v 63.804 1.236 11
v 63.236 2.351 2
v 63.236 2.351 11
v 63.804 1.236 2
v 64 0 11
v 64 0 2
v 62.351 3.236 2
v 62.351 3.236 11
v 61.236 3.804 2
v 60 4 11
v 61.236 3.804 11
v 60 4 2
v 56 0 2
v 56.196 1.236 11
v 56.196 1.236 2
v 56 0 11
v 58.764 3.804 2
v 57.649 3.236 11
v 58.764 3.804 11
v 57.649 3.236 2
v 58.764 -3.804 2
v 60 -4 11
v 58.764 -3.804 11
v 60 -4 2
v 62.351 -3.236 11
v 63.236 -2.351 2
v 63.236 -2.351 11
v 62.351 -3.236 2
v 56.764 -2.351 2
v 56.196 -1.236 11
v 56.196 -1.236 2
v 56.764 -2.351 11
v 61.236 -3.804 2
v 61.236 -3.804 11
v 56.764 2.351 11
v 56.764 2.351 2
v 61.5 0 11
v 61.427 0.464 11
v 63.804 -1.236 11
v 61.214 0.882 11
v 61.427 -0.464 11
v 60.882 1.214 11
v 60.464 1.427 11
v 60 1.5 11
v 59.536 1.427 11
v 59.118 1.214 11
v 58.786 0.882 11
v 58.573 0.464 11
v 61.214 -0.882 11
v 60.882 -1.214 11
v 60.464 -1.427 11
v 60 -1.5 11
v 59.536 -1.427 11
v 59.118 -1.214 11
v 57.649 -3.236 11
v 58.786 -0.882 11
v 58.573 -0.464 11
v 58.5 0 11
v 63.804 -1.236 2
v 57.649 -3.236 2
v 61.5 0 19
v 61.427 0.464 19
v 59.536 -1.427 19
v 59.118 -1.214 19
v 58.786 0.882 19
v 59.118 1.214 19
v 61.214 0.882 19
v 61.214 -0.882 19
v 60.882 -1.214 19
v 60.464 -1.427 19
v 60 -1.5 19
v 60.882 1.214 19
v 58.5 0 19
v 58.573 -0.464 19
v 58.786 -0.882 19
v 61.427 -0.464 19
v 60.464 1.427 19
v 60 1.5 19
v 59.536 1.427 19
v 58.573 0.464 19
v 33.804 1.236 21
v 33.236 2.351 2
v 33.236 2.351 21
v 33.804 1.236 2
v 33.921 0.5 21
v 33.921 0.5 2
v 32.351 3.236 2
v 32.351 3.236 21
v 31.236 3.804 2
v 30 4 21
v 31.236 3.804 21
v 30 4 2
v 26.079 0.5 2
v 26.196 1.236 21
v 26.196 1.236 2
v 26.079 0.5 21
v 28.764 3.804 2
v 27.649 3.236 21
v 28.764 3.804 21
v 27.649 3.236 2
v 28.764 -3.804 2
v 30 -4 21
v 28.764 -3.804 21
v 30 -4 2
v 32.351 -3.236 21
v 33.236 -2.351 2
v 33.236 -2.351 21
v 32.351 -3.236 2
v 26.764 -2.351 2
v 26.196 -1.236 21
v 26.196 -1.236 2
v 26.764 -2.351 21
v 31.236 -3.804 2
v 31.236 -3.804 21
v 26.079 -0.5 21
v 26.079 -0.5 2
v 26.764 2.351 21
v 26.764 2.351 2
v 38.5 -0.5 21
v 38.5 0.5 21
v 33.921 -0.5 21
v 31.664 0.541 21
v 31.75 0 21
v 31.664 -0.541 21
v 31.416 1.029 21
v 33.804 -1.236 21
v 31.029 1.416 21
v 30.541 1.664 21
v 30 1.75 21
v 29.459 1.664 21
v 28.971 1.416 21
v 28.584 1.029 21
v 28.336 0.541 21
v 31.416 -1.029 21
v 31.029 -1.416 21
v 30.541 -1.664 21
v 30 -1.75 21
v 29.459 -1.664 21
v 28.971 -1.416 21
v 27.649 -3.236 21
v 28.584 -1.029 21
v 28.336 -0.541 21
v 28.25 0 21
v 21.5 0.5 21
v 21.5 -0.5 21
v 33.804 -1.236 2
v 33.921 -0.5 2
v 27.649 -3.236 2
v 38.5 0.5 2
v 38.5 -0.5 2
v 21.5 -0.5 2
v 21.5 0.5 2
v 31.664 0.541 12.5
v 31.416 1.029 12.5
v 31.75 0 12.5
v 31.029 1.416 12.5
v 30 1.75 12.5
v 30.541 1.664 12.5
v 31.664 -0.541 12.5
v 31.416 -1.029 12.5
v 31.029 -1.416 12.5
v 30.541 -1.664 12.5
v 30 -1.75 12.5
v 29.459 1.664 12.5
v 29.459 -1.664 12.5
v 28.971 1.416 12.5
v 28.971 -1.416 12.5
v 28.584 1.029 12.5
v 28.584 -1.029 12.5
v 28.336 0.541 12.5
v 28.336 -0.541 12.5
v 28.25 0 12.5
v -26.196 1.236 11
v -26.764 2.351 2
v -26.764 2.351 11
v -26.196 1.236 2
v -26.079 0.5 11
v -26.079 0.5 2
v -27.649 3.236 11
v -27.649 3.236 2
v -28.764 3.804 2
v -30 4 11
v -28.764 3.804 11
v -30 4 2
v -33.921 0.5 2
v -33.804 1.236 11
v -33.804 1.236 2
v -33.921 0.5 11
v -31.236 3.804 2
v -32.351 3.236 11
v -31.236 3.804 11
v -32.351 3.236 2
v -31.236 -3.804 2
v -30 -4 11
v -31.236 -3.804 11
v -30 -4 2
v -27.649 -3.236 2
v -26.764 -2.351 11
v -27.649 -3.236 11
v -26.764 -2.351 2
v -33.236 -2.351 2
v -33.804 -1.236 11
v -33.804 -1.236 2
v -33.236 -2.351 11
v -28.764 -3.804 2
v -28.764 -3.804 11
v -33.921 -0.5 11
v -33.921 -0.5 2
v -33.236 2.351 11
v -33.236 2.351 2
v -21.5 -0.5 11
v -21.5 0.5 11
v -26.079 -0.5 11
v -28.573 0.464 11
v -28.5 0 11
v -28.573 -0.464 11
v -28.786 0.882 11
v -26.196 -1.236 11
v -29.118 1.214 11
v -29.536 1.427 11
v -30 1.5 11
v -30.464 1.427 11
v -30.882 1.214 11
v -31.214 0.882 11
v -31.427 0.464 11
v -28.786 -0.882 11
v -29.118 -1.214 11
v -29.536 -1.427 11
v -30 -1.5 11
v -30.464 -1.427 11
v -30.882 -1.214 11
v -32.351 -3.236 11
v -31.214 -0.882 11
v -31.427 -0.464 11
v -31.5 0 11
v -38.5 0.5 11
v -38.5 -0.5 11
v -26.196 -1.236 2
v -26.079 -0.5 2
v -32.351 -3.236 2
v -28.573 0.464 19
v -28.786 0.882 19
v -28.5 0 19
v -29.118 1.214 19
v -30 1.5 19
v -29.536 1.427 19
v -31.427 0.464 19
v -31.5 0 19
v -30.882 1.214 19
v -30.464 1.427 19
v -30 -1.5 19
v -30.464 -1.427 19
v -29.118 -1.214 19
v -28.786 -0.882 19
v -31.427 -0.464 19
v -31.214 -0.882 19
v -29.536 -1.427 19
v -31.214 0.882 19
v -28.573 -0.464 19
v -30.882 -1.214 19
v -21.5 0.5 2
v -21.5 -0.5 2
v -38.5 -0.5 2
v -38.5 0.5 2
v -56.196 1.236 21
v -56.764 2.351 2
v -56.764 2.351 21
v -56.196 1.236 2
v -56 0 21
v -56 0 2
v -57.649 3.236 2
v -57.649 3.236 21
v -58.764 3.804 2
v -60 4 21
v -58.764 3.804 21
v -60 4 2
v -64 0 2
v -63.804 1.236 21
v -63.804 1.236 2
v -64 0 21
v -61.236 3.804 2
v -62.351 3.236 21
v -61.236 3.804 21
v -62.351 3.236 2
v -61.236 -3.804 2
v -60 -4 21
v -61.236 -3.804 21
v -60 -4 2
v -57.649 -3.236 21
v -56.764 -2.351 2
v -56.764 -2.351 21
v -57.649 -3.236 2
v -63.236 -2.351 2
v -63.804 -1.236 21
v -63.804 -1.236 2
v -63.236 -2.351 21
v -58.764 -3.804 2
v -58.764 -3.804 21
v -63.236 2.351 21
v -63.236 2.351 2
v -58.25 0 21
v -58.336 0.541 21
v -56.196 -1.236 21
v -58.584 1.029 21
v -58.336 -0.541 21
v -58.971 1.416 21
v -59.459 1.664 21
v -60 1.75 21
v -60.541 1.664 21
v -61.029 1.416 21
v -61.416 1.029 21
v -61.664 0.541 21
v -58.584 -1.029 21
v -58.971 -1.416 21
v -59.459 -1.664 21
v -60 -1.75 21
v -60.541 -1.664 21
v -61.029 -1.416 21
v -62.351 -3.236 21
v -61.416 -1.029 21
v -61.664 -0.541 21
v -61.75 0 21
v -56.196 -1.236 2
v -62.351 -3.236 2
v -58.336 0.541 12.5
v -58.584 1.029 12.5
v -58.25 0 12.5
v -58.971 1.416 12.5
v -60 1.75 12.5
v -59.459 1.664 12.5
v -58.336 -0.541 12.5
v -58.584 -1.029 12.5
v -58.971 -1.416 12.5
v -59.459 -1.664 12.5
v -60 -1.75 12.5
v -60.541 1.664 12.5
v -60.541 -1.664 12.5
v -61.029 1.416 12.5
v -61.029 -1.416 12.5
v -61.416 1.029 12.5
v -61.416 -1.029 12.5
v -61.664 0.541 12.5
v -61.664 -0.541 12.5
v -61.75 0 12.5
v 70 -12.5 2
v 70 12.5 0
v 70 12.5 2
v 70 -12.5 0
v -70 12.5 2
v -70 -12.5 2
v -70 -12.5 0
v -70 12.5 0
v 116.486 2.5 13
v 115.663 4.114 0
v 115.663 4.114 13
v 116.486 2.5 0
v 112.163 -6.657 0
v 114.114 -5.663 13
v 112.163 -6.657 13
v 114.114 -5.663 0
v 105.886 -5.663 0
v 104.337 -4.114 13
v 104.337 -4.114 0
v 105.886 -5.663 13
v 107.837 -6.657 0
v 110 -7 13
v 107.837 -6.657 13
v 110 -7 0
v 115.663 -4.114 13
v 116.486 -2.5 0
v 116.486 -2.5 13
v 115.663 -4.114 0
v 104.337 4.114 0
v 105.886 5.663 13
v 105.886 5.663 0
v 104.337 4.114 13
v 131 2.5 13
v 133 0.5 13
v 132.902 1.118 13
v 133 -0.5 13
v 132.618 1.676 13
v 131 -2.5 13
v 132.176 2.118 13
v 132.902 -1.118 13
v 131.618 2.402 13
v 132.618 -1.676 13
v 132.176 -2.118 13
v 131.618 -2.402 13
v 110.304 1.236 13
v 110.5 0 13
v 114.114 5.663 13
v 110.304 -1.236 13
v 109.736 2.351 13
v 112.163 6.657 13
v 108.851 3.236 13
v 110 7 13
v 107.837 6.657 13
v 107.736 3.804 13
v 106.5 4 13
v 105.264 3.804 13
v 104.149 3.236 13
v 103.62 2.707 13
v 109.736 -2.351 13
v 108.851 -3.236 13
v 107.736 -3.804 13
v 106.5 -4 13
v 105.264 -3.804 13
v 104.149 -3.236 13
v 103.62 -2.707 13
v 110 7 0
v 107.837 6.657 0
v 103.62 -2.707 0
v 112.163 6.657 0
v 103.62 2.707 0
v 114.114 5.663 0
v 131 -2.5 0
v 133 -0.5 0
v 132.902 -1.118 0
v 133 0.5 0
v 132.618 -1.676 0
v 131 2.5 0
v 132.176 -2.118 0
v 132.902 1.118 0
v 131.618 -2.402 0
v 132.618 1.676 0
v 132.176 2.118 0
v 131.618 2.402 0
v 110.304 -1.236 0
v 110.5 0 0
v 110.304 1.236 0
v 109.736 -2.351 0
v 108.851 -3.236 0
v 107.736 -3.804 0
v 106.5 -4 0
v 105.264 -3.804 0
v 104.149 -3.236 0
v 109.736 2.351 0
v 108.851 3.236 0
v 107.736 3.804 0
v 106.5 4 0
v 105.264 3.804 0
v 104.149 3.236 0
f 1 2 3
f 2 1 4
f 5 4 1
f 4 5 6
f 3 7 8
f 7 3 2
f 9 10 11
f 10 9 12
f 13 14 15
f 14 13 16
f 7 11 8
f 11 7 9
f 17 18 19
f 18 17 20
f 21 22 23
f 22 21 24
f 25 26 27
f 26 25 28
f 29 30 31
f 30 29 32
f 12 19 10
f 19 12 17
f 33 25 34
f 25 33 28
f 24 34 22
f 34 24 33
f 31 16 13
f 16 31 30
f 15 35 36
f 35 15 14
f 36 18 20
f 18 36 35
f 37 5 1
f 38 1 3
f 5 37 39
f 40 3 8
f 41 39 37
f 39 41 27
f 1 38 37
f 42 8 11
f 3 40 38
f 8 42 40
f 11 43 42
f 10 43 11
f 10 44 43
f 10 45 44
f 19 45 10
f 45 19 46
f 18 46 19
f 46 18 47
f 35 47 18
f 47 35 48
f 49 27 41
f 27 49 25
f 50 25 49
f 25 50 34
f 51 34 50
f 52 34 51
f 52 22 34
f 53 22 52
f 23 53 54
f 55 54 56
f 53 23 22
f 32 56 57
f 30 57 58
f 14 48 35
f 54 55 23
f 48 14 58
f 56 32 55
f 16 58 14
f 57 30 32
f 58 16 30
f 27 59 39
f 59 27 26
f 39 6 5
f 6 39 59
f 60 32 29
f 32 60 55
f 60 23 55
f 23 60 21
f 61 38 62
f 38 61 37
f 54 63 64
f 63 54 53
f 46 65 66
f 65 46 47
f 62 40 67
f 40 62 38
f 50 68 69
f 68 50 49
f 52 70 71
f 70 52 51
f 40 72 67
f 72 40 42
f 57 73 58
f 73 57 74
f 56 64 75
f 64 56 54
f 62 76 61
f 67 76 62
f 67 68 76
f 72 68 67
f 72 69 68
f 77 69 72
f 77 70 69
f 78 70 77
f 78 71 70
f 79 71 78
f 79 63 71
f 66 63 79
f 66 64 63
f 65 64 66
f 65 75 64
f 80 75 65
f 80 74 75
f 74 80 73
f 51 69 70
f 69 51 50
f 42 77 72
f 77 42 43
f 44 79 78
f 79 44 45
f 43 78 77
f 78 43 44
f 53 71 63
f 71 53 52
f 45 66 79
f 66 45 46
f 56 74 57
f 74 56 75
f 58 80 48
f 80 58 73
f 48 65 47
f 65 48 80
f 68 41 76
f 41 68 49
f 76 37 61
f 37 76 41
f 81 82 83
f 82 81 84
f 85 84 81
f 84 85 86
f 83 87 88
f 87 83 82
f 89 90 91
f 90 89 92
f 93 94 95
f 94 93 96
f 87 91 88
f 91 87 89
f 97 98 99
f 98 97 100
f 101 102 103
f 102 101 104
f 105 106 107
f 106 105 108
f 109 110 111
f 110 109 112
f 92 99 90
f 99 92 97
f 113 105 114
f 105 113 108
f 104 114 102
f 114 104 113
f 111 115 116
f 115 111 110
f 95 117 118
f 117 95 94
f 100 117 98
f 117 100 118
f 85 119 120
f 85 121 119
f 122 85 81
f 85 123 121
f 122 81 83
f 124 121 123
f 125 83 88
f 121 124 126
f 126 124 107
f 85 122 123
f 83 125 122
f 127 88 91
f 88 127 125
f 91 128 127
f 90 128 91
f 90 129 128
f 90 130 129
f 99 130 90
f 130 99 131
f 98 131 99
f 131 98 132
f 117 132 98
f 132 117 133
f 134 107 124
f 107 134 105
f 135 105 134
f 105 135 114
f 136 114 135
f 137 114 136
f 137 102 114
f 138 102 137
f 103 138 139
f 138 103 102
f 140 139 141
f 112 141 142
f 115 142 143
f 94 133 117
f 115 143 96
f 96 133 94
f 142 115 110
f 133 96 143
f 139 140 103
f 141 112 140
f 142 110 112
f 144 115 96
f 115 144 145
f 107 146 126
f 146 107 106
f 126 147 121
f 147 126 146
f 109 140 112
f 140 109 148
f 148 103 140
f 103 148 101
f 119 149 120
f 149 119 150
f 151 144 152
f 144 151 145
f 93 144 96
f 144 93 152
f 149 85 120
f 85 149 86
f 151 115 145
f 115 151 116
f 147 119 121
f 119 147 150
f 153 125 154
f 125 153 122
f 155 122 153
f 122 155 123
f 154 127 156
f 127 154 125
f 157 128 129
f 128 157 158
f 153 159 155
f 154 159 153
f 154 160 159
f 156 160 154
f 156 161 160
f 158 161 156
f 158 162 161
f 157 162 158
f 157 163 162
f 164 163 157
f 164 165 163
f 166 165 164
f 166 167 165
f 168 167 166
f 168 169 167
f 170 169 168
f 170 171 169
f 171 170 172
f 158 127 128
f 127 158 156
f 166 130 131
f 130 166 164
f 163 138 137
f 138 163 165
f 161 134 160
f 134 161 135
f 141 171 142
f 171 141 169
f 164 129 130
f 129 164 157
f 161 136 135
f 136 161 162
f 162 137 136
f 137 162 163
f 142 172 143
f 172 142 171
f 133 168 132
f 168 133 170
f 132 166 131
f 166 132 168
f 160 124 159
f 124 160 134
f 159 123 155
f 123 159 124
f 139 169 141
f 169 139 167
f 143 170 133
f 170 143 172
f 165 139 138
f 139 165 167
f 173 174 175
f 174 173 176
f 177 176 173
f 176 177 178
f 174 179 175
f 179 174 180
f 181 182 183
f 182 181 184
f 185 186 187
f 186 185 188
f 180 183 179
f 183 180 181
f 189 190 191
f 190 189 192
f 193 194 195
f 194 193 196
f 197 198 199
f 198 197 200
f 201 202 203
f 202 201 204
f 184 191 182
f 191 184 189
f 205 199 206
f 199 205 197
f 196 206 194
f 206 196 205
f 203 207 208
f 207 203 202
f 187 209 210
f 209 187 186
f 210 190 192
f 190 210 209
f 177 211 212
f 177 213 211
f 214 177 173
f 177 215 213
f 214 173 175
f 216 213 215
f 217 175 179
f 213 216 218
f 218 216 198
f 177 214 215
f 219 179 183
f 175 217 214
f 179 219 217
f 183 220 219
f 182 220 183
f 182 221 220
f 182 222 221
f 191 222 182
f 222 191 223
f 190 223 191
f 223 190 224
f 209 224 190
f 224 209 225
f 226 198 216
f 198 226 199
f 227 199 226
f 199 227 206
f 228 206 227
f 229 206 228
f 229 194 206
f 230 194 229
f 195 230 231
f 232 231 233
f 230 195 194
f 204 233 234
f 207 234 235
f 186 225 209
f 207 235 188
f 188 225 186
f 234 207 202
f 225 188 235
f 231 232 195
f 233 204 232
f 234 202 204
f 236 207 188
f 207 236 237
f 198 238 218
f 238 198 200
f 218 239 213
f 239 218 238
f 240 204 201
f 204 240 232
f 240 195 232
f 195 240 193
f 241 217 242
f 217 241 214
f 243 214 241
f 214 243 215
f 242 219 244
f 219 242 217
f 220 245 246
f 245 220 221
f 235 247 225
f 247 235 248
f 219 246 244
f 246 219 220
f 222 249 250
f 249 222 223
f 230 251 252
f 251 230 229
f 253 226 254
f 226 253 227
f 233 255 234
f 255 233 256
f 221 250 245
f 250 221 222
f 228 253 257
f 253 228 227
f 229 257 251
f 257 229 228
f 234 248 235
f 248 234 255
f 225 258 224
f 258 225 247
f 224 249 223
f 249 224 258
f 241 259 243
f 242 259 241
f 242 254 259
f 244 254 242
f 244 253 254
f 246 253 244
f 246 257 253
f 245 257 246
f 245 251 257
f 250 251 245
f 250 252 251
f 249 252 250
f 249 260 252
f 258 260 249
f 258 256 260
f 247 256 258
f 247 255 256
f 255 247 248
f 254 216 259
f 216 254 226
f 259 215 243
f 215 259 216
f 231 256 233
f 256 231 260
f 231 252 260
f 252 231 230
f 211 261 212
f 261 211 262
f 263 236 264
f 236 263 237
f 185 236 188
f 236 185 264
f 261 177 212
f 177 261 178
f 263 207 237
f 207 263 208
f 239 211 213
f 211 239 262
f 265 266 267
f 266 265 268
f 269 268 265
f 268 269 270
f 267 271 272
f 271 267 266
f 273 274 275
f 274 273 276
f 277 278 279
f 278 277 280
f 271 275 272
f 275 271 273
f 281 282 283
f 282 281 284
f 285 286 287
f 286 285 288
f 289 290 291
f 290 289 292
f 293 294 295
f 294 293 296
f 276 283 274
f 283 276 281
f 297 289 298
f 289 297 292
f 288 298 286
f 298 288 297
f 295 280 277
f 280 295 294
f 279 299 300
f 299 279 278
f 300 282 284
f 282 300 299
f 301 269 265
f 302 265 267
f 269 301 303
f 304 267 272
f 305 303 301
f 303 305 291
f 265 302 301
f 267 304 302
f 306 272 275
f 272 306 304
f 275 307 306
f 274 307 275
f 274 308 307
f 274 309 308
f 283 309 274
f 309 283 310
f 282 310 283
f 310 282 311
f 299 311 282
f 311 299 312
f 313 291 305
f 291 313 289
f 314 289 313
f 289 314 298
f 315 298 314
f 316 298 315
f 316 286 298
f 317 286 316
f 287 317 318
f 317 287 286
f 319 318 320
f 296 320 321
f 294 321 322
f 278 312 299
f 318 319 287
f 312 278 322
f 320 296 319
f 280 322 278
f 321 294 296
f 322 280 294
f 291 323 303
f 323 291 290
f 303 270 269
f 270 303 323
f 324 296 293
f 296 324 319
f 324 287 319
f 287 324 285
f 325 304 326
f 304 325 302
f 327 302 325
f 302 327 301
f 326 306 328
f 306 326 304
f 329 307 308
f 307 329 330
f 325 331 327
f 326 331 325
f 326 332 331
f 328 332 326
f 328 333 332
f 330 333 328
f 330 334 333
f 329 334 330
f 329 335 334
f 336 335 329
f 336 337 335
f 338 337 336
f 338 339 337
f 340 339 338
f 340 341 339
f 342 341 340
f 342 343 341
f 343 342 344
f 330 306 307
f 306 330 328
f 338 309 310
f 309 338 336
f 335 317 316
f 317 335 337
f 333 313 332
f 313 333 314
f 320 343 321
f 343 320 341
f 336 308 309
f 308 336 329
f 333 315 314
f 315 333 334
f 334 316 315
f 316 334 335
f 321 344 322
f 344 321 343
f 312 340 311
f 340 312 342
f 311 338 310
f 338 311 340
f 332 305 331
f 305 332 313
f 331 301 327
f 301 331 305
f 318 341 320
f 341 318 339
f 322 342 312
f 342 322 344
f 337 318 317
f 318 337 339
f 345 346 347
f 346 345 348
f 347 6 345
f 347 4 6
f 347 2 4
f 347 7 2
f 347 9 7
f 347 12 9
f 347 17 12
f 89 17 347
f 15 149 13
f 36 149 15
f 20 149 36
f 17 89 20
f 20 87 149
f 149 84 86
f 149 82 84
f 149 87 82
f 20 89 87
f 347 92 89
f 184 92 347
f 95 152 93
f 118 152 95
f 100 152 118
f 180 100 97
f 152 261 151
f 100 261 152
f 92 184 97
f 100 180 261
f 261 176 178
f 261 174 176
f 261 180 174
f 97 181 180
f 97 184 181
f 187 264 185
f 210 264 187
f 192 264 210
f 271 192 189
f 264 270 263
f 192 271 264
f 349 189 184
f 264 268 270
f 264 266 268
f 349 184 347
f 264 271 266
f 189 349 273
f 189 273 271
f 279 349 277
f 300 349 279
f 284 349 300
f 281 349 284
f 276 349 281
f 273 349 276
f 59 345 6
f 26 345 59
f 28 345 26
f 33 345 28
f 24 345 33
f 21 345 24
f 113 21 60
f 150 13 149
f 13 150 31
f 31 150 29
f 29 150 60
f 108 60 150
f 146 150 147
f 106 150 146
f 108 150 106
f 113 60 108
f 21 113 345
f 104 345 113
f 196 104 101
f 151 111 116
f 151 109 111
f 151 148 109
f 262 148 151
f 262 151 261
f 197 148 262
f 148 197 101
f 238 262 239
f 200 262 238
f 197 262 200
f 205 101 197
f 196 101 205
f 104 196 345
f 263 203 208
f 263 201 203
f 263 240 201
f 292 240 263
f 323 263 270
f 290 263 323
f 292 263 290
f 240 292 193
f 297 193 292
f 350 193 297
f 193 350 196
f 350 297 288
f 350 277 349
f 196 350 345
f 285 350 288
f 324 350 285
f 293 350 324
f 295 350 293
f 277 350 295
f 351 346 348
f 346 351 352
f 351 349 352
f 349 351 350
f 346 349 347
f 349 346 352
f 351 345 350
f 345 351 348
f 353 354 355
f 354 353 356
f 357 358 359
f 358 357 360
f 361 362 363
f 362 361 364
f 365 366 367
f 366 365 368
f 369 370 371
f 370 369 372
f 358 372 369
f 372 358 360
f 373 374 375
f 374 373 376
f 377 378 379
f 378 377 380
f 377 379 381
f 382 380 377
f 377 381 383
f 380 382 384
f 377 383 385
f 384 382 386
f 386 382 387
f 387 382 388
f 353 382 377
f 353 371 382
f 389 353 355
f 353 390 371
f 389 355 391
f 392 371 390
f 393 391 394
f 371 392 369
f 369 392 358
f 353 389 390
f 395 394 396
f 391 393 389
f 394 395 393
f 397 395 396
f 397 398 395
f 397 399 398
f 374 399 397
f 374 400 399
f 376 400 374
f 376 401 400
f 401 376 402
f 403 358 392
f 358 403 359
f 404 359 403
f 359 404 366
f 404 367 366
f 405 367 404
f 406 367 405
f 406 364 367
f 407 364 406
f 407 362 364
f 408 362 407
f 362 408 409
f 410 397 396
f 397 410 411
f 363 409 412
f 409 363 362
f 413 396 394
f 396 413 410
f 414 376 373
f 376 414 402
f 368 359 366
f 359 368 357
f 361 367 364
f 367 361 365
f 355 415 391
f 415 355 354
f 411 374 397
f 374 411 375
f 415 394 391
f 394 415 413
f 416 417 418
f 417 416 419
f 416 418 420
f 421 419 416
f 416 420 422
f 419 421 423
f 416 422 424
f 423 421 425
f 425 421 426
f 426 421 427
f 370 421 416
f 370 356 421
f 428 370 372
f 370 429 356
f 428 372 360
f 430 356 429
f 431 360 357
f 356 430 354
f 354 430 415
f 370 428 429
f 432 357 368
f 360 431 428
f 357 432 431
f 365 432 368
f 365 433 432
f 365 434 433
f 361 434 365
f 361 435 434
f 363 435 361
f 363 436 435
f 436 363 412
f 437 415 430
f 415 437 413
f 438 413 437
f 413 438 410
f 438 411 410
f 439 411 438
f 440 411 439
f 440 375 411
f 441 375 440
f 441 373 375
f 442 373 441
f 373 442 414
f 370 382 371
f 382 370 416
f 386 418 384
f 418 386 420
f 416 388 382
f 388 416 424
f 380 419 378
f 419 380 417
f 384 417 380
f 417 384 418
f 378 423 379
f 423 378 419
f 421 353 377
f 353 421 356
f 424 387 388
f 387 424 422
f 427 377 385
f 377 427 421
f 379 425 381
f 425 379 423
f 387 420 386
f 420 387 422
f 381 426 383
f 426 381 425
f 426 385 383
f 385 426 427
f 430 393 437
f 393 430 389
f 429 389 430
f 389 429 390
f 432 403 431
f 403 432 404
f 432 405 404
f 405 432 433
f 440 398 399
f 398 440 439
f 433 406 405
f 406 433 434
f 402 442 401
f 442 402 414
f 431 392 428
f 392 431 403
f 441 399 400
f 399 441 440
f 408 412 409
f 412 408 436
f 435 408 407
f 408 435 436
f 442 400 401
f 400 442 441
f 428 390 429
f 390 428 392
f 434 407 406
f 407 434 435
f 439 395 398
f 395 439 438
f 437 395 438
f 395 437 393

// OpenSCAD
/*
 * This program is free software: you can redistribute it and/or modify
 * it under the terms of the GNU General Public License as published by
 * the Free Software Foundation, version 3.
 *
 * This program is distributed in the hope that it will be useful, but
 * WITHOUT ANY WARRANTY; without even the implied warranty of
 * MERCHANTABILITY or FITNESS FOR A PARTICULAR PURPOSE. See the GNU
 * General Public License for more details.
 *
 * You should have received a copy of the GNU General Public License
 * along with this program. If not, see <http://www.gnu.org/licenses/>.
 */

/* [Main dimension] */
// Total length of spool from end to end
totalLength = 140;
// Width of spool
totalWidth = 25;
// Thickness of walls
wallThickness = 2;

/* [Hidden] */
wallRounding = 2;

/* [Pin dimensions] */
// Width of big part of pins
bigPinWidth = 8;
// Height of big part of pins
bigPinHeight = 10;
// Width of small part of pins
smallPinWidth = 3;
// Height of small part of pins
smallPinHeight = 8;

// Length of "hook holder" wall
hookHolderLength = 9;
// Width of "hook holder" wall
hookHolderWidth = 1;

/* [Pin placement] */
// Distance from end for placement of first pair of pins
pin1Distance = 10;
// Length from end for placement of second pair of pins
pin2Distance = 40;

/* [Printer compensation] */
// Make hole slightly bigger to compensate for 3d printer inaccuracy
// Make hole inside pin this much wider than the small pin
holeCompensationWidth = 0.5;
// Make hole inside pin this much longer than the small pin
holeCompensationLength = 1;


/* [Lineholder] */
// Make lineholder hole this much wider than the big pin
lineHolderHoleWidthCompensation = 1.5;
lineHolderHoleThickness = bigPinWidth + lineHolderHoleWidthCompensation;
// Make lineholder outwards circle this much wider than the big pin
lineHolderCircleThicknessIncrement = 6;
lineHolderCircleThickness = bigPinWidth + lineHolderCircleThicknessIncrement;

// Thickness of "handle"
lineHolderHandleThickness = 3;
// Wiggle room for width. How much space is left on the sides
lineHolderHandleWidthWiggleRoom = 5;
lineHolderHandleWidth = bigPinHeight+smallPinHeight-lineHolderHandleWidthWiggleRoom;
// Length of the handle
lineHolderHandleLength = 20;


// Smoothness (of circles).
// Can be put lower(20) when testing for better performance, and higher(40) for final export
$fn = 20 + 0;


wholeSpool();
lineHolder();

module bottomPlate () {
    color("blue")
    translate(v = [0, 0, wallThickness/2])
    // The roundedcube() screws up the wallthickness and
    // everything else becomes wrong...
    /*
    roundedcube(
        [
        totalLength,
        totalWidth,
        wallThickness
        ]
        ,
        true,
        wallRounding,
        "z"
    );
    */
    cube([totalLength, totalWidth, wallThickness], true);
}


module pin (hookHolder) {
    bigLift = (wallThickness/2)+(bigPinHeight/2);
    echo(bigLift=bigLift);
    color("red")

    translate(v = [0, 0, bigLift])
        cylinder(h=bigPinHeight, d=bigPinWidth, center=true);

    color("green")
    translate(v = [0, 0, bigLift+bigPinHeight-1])
        cylinder(h=smallPinHeight, d=smallPinWidth, center=true);

    if (hookHolder) {
        color("purple")
        translate(
            v = [
                    0,
                    0,
                    (wallThickness/2)+((bigPinHeight)/2)
                ]
            )
            cube(
                [
                    bigPinWidth+hookHolderLength,
                    hookHolderWidth,
                    bigPinHeight
                ],
                true
            );
    }
}

module hole (hookHolder) {
    color("orange")
    difference() {
    PinForHole(hookHolder);


    color("green")
    translate(
        v = [
            0,
            0,
            bigPinHeight+bigPinHeight-(smallPinHeight/2)+holeCompensationLength
            ]
        )
        cylinder(
        h=smallPinHeight+holeCompensationLength,
        d=smallPinWidth+holeCompensationWidth,
        center=true
        );
    }
}

module PinForHole(hookHolder) {
        translate(
            v = [
                    0,
                    0,
                    (((bigPinHeight+bigPinHeight)/2)+(wallThickness/2))
            ]
        )
        cylinder(h=bigPinHeight+bigPinHeight, d=bigPinWidth, center=true);
    if (hookHolder) {
        color("purple")
        translate(
        v = [
                0,
                0,
                ((wallThickness/2)+(bigPinHeight+bigPinHeight)/2)
            ]
        )
        cube(
            [
                bigPinWidth+hookHolderLength,
                hookHolderWidth,
                bigPinHeight+bigPinHeight
            ],
            true
        );
    }
}


module wholeSpool() {
    bottomPlate ();
    // 1: Create pin
    translate(v = [(totalLength/2)-pin1Distance, 0, 0]) pin(false);

    // 2: Create hole
    translate(v = [(totalLength/2)-pin2Distance, 0, 0]) hole(true);

    // 3: Create pin
    translate(v = [-(totalLength/2)+pin2Distance, 0, 0]) pin(true);
    //translate(v = [-(totalLength/2)+26, 0, 0]) hole();

    // 4: Create hole
    translate(v = [-(totalLength/2)+pin1Distance, 0, 0]) hole(false);
}


module lineHolder () {
    color("grey")
    difference () {
        lineHolderParts();
        translate(v = [(totalLength/2)+36.5, 0, 0])
       cylinder(h=bigPinHeight+smallPinHeight+20, d=bigPinWidth, center=true);
    }

}

module lineHolderParts () {
    color("grey")
       translate(v = [(totalLength/2)+ 40, 0, lineHolderHandleWidth/2])
         cylinder(h=lineHolderHandleWidth, d=lineHolderCircleThickness, center=true);
       translate(v = [(totalLength/2)+ 53, 0, lineHolderHandleWidth/2])
         roundedcube([lineHolderHandleLength, lineHolderHandleThickness, lineHolderHandleWidth], true, wallRounding, "z");
    }





// More information: https://danielupshaw.com/openscad-rounded-corners/

// Set to 0.01 for higher definition curves (renders slower)
$fs = 0.15;

module roundedcube(size = [1, 1, 1], center = false, radius = 0.5, apply_to = "all") {
	// If single value, convert to [x, y, z] vector
	size = (size[0] == undef) ? [size, size, size] : size;

	translate_min = radius;
	translate_xmax = size[0] - radius;
	translate_ymax = size[1] - radius;
	translate_zmax = size[2] - radius;

	diameter = radius * 2;

	obj_translate = (center == false) ?
		[0, 0, 0] : [
			-(size[0] / 2),
			-(size[1] / 2),
			-(size[2] / 2)
		];

	translate(v = obj_translate) {
		hull() {
			for (translate_x = [translate_min, translate_xmax]) {
				x_at = (translate_x == translate_min) ? "min" : "max";
				for (translate_y = [translate_min, translate_ymax]) {
					y_at = (translate_y == translate_min) ? "min" : "max";
					for (translate_z = [translate_min, translate_zmax]) {
						z_at = (translate_z == translate_min) ? "min" : "max";

						translate(v = [translate_x, translate_y, translate_z])
						if (
							(apply_to == "all") ||
							(apply_to == "xmin" && x_at == "min") || (apply_to == "xmax" && x_at == "max") ||
							(apply_to == "ymin" && y_at == "min") || (apply_to == "ymax" && y_at == "max") ||
							(apply_to == "zmin" && z_at == "min") || (apply_to == "zmax" && z_at == "max")
						) {
							sphere(r = radius);
						} else {
							rotate =
								(apply_to == "xmin" || apply_to == "xmax" || apply_to == "x") ? [0, 90, 0] : (
								(apply_to == "ymin" || apply_to == "ymax" || apply_to == "y") ? [90, 90, 0] :
								[0, 0, 0]
							);
							rotate(a = rotate)
							cylinder(h = diameter, r = radius, center = true);
						}
					}
				}
			}
		}
	}
}
